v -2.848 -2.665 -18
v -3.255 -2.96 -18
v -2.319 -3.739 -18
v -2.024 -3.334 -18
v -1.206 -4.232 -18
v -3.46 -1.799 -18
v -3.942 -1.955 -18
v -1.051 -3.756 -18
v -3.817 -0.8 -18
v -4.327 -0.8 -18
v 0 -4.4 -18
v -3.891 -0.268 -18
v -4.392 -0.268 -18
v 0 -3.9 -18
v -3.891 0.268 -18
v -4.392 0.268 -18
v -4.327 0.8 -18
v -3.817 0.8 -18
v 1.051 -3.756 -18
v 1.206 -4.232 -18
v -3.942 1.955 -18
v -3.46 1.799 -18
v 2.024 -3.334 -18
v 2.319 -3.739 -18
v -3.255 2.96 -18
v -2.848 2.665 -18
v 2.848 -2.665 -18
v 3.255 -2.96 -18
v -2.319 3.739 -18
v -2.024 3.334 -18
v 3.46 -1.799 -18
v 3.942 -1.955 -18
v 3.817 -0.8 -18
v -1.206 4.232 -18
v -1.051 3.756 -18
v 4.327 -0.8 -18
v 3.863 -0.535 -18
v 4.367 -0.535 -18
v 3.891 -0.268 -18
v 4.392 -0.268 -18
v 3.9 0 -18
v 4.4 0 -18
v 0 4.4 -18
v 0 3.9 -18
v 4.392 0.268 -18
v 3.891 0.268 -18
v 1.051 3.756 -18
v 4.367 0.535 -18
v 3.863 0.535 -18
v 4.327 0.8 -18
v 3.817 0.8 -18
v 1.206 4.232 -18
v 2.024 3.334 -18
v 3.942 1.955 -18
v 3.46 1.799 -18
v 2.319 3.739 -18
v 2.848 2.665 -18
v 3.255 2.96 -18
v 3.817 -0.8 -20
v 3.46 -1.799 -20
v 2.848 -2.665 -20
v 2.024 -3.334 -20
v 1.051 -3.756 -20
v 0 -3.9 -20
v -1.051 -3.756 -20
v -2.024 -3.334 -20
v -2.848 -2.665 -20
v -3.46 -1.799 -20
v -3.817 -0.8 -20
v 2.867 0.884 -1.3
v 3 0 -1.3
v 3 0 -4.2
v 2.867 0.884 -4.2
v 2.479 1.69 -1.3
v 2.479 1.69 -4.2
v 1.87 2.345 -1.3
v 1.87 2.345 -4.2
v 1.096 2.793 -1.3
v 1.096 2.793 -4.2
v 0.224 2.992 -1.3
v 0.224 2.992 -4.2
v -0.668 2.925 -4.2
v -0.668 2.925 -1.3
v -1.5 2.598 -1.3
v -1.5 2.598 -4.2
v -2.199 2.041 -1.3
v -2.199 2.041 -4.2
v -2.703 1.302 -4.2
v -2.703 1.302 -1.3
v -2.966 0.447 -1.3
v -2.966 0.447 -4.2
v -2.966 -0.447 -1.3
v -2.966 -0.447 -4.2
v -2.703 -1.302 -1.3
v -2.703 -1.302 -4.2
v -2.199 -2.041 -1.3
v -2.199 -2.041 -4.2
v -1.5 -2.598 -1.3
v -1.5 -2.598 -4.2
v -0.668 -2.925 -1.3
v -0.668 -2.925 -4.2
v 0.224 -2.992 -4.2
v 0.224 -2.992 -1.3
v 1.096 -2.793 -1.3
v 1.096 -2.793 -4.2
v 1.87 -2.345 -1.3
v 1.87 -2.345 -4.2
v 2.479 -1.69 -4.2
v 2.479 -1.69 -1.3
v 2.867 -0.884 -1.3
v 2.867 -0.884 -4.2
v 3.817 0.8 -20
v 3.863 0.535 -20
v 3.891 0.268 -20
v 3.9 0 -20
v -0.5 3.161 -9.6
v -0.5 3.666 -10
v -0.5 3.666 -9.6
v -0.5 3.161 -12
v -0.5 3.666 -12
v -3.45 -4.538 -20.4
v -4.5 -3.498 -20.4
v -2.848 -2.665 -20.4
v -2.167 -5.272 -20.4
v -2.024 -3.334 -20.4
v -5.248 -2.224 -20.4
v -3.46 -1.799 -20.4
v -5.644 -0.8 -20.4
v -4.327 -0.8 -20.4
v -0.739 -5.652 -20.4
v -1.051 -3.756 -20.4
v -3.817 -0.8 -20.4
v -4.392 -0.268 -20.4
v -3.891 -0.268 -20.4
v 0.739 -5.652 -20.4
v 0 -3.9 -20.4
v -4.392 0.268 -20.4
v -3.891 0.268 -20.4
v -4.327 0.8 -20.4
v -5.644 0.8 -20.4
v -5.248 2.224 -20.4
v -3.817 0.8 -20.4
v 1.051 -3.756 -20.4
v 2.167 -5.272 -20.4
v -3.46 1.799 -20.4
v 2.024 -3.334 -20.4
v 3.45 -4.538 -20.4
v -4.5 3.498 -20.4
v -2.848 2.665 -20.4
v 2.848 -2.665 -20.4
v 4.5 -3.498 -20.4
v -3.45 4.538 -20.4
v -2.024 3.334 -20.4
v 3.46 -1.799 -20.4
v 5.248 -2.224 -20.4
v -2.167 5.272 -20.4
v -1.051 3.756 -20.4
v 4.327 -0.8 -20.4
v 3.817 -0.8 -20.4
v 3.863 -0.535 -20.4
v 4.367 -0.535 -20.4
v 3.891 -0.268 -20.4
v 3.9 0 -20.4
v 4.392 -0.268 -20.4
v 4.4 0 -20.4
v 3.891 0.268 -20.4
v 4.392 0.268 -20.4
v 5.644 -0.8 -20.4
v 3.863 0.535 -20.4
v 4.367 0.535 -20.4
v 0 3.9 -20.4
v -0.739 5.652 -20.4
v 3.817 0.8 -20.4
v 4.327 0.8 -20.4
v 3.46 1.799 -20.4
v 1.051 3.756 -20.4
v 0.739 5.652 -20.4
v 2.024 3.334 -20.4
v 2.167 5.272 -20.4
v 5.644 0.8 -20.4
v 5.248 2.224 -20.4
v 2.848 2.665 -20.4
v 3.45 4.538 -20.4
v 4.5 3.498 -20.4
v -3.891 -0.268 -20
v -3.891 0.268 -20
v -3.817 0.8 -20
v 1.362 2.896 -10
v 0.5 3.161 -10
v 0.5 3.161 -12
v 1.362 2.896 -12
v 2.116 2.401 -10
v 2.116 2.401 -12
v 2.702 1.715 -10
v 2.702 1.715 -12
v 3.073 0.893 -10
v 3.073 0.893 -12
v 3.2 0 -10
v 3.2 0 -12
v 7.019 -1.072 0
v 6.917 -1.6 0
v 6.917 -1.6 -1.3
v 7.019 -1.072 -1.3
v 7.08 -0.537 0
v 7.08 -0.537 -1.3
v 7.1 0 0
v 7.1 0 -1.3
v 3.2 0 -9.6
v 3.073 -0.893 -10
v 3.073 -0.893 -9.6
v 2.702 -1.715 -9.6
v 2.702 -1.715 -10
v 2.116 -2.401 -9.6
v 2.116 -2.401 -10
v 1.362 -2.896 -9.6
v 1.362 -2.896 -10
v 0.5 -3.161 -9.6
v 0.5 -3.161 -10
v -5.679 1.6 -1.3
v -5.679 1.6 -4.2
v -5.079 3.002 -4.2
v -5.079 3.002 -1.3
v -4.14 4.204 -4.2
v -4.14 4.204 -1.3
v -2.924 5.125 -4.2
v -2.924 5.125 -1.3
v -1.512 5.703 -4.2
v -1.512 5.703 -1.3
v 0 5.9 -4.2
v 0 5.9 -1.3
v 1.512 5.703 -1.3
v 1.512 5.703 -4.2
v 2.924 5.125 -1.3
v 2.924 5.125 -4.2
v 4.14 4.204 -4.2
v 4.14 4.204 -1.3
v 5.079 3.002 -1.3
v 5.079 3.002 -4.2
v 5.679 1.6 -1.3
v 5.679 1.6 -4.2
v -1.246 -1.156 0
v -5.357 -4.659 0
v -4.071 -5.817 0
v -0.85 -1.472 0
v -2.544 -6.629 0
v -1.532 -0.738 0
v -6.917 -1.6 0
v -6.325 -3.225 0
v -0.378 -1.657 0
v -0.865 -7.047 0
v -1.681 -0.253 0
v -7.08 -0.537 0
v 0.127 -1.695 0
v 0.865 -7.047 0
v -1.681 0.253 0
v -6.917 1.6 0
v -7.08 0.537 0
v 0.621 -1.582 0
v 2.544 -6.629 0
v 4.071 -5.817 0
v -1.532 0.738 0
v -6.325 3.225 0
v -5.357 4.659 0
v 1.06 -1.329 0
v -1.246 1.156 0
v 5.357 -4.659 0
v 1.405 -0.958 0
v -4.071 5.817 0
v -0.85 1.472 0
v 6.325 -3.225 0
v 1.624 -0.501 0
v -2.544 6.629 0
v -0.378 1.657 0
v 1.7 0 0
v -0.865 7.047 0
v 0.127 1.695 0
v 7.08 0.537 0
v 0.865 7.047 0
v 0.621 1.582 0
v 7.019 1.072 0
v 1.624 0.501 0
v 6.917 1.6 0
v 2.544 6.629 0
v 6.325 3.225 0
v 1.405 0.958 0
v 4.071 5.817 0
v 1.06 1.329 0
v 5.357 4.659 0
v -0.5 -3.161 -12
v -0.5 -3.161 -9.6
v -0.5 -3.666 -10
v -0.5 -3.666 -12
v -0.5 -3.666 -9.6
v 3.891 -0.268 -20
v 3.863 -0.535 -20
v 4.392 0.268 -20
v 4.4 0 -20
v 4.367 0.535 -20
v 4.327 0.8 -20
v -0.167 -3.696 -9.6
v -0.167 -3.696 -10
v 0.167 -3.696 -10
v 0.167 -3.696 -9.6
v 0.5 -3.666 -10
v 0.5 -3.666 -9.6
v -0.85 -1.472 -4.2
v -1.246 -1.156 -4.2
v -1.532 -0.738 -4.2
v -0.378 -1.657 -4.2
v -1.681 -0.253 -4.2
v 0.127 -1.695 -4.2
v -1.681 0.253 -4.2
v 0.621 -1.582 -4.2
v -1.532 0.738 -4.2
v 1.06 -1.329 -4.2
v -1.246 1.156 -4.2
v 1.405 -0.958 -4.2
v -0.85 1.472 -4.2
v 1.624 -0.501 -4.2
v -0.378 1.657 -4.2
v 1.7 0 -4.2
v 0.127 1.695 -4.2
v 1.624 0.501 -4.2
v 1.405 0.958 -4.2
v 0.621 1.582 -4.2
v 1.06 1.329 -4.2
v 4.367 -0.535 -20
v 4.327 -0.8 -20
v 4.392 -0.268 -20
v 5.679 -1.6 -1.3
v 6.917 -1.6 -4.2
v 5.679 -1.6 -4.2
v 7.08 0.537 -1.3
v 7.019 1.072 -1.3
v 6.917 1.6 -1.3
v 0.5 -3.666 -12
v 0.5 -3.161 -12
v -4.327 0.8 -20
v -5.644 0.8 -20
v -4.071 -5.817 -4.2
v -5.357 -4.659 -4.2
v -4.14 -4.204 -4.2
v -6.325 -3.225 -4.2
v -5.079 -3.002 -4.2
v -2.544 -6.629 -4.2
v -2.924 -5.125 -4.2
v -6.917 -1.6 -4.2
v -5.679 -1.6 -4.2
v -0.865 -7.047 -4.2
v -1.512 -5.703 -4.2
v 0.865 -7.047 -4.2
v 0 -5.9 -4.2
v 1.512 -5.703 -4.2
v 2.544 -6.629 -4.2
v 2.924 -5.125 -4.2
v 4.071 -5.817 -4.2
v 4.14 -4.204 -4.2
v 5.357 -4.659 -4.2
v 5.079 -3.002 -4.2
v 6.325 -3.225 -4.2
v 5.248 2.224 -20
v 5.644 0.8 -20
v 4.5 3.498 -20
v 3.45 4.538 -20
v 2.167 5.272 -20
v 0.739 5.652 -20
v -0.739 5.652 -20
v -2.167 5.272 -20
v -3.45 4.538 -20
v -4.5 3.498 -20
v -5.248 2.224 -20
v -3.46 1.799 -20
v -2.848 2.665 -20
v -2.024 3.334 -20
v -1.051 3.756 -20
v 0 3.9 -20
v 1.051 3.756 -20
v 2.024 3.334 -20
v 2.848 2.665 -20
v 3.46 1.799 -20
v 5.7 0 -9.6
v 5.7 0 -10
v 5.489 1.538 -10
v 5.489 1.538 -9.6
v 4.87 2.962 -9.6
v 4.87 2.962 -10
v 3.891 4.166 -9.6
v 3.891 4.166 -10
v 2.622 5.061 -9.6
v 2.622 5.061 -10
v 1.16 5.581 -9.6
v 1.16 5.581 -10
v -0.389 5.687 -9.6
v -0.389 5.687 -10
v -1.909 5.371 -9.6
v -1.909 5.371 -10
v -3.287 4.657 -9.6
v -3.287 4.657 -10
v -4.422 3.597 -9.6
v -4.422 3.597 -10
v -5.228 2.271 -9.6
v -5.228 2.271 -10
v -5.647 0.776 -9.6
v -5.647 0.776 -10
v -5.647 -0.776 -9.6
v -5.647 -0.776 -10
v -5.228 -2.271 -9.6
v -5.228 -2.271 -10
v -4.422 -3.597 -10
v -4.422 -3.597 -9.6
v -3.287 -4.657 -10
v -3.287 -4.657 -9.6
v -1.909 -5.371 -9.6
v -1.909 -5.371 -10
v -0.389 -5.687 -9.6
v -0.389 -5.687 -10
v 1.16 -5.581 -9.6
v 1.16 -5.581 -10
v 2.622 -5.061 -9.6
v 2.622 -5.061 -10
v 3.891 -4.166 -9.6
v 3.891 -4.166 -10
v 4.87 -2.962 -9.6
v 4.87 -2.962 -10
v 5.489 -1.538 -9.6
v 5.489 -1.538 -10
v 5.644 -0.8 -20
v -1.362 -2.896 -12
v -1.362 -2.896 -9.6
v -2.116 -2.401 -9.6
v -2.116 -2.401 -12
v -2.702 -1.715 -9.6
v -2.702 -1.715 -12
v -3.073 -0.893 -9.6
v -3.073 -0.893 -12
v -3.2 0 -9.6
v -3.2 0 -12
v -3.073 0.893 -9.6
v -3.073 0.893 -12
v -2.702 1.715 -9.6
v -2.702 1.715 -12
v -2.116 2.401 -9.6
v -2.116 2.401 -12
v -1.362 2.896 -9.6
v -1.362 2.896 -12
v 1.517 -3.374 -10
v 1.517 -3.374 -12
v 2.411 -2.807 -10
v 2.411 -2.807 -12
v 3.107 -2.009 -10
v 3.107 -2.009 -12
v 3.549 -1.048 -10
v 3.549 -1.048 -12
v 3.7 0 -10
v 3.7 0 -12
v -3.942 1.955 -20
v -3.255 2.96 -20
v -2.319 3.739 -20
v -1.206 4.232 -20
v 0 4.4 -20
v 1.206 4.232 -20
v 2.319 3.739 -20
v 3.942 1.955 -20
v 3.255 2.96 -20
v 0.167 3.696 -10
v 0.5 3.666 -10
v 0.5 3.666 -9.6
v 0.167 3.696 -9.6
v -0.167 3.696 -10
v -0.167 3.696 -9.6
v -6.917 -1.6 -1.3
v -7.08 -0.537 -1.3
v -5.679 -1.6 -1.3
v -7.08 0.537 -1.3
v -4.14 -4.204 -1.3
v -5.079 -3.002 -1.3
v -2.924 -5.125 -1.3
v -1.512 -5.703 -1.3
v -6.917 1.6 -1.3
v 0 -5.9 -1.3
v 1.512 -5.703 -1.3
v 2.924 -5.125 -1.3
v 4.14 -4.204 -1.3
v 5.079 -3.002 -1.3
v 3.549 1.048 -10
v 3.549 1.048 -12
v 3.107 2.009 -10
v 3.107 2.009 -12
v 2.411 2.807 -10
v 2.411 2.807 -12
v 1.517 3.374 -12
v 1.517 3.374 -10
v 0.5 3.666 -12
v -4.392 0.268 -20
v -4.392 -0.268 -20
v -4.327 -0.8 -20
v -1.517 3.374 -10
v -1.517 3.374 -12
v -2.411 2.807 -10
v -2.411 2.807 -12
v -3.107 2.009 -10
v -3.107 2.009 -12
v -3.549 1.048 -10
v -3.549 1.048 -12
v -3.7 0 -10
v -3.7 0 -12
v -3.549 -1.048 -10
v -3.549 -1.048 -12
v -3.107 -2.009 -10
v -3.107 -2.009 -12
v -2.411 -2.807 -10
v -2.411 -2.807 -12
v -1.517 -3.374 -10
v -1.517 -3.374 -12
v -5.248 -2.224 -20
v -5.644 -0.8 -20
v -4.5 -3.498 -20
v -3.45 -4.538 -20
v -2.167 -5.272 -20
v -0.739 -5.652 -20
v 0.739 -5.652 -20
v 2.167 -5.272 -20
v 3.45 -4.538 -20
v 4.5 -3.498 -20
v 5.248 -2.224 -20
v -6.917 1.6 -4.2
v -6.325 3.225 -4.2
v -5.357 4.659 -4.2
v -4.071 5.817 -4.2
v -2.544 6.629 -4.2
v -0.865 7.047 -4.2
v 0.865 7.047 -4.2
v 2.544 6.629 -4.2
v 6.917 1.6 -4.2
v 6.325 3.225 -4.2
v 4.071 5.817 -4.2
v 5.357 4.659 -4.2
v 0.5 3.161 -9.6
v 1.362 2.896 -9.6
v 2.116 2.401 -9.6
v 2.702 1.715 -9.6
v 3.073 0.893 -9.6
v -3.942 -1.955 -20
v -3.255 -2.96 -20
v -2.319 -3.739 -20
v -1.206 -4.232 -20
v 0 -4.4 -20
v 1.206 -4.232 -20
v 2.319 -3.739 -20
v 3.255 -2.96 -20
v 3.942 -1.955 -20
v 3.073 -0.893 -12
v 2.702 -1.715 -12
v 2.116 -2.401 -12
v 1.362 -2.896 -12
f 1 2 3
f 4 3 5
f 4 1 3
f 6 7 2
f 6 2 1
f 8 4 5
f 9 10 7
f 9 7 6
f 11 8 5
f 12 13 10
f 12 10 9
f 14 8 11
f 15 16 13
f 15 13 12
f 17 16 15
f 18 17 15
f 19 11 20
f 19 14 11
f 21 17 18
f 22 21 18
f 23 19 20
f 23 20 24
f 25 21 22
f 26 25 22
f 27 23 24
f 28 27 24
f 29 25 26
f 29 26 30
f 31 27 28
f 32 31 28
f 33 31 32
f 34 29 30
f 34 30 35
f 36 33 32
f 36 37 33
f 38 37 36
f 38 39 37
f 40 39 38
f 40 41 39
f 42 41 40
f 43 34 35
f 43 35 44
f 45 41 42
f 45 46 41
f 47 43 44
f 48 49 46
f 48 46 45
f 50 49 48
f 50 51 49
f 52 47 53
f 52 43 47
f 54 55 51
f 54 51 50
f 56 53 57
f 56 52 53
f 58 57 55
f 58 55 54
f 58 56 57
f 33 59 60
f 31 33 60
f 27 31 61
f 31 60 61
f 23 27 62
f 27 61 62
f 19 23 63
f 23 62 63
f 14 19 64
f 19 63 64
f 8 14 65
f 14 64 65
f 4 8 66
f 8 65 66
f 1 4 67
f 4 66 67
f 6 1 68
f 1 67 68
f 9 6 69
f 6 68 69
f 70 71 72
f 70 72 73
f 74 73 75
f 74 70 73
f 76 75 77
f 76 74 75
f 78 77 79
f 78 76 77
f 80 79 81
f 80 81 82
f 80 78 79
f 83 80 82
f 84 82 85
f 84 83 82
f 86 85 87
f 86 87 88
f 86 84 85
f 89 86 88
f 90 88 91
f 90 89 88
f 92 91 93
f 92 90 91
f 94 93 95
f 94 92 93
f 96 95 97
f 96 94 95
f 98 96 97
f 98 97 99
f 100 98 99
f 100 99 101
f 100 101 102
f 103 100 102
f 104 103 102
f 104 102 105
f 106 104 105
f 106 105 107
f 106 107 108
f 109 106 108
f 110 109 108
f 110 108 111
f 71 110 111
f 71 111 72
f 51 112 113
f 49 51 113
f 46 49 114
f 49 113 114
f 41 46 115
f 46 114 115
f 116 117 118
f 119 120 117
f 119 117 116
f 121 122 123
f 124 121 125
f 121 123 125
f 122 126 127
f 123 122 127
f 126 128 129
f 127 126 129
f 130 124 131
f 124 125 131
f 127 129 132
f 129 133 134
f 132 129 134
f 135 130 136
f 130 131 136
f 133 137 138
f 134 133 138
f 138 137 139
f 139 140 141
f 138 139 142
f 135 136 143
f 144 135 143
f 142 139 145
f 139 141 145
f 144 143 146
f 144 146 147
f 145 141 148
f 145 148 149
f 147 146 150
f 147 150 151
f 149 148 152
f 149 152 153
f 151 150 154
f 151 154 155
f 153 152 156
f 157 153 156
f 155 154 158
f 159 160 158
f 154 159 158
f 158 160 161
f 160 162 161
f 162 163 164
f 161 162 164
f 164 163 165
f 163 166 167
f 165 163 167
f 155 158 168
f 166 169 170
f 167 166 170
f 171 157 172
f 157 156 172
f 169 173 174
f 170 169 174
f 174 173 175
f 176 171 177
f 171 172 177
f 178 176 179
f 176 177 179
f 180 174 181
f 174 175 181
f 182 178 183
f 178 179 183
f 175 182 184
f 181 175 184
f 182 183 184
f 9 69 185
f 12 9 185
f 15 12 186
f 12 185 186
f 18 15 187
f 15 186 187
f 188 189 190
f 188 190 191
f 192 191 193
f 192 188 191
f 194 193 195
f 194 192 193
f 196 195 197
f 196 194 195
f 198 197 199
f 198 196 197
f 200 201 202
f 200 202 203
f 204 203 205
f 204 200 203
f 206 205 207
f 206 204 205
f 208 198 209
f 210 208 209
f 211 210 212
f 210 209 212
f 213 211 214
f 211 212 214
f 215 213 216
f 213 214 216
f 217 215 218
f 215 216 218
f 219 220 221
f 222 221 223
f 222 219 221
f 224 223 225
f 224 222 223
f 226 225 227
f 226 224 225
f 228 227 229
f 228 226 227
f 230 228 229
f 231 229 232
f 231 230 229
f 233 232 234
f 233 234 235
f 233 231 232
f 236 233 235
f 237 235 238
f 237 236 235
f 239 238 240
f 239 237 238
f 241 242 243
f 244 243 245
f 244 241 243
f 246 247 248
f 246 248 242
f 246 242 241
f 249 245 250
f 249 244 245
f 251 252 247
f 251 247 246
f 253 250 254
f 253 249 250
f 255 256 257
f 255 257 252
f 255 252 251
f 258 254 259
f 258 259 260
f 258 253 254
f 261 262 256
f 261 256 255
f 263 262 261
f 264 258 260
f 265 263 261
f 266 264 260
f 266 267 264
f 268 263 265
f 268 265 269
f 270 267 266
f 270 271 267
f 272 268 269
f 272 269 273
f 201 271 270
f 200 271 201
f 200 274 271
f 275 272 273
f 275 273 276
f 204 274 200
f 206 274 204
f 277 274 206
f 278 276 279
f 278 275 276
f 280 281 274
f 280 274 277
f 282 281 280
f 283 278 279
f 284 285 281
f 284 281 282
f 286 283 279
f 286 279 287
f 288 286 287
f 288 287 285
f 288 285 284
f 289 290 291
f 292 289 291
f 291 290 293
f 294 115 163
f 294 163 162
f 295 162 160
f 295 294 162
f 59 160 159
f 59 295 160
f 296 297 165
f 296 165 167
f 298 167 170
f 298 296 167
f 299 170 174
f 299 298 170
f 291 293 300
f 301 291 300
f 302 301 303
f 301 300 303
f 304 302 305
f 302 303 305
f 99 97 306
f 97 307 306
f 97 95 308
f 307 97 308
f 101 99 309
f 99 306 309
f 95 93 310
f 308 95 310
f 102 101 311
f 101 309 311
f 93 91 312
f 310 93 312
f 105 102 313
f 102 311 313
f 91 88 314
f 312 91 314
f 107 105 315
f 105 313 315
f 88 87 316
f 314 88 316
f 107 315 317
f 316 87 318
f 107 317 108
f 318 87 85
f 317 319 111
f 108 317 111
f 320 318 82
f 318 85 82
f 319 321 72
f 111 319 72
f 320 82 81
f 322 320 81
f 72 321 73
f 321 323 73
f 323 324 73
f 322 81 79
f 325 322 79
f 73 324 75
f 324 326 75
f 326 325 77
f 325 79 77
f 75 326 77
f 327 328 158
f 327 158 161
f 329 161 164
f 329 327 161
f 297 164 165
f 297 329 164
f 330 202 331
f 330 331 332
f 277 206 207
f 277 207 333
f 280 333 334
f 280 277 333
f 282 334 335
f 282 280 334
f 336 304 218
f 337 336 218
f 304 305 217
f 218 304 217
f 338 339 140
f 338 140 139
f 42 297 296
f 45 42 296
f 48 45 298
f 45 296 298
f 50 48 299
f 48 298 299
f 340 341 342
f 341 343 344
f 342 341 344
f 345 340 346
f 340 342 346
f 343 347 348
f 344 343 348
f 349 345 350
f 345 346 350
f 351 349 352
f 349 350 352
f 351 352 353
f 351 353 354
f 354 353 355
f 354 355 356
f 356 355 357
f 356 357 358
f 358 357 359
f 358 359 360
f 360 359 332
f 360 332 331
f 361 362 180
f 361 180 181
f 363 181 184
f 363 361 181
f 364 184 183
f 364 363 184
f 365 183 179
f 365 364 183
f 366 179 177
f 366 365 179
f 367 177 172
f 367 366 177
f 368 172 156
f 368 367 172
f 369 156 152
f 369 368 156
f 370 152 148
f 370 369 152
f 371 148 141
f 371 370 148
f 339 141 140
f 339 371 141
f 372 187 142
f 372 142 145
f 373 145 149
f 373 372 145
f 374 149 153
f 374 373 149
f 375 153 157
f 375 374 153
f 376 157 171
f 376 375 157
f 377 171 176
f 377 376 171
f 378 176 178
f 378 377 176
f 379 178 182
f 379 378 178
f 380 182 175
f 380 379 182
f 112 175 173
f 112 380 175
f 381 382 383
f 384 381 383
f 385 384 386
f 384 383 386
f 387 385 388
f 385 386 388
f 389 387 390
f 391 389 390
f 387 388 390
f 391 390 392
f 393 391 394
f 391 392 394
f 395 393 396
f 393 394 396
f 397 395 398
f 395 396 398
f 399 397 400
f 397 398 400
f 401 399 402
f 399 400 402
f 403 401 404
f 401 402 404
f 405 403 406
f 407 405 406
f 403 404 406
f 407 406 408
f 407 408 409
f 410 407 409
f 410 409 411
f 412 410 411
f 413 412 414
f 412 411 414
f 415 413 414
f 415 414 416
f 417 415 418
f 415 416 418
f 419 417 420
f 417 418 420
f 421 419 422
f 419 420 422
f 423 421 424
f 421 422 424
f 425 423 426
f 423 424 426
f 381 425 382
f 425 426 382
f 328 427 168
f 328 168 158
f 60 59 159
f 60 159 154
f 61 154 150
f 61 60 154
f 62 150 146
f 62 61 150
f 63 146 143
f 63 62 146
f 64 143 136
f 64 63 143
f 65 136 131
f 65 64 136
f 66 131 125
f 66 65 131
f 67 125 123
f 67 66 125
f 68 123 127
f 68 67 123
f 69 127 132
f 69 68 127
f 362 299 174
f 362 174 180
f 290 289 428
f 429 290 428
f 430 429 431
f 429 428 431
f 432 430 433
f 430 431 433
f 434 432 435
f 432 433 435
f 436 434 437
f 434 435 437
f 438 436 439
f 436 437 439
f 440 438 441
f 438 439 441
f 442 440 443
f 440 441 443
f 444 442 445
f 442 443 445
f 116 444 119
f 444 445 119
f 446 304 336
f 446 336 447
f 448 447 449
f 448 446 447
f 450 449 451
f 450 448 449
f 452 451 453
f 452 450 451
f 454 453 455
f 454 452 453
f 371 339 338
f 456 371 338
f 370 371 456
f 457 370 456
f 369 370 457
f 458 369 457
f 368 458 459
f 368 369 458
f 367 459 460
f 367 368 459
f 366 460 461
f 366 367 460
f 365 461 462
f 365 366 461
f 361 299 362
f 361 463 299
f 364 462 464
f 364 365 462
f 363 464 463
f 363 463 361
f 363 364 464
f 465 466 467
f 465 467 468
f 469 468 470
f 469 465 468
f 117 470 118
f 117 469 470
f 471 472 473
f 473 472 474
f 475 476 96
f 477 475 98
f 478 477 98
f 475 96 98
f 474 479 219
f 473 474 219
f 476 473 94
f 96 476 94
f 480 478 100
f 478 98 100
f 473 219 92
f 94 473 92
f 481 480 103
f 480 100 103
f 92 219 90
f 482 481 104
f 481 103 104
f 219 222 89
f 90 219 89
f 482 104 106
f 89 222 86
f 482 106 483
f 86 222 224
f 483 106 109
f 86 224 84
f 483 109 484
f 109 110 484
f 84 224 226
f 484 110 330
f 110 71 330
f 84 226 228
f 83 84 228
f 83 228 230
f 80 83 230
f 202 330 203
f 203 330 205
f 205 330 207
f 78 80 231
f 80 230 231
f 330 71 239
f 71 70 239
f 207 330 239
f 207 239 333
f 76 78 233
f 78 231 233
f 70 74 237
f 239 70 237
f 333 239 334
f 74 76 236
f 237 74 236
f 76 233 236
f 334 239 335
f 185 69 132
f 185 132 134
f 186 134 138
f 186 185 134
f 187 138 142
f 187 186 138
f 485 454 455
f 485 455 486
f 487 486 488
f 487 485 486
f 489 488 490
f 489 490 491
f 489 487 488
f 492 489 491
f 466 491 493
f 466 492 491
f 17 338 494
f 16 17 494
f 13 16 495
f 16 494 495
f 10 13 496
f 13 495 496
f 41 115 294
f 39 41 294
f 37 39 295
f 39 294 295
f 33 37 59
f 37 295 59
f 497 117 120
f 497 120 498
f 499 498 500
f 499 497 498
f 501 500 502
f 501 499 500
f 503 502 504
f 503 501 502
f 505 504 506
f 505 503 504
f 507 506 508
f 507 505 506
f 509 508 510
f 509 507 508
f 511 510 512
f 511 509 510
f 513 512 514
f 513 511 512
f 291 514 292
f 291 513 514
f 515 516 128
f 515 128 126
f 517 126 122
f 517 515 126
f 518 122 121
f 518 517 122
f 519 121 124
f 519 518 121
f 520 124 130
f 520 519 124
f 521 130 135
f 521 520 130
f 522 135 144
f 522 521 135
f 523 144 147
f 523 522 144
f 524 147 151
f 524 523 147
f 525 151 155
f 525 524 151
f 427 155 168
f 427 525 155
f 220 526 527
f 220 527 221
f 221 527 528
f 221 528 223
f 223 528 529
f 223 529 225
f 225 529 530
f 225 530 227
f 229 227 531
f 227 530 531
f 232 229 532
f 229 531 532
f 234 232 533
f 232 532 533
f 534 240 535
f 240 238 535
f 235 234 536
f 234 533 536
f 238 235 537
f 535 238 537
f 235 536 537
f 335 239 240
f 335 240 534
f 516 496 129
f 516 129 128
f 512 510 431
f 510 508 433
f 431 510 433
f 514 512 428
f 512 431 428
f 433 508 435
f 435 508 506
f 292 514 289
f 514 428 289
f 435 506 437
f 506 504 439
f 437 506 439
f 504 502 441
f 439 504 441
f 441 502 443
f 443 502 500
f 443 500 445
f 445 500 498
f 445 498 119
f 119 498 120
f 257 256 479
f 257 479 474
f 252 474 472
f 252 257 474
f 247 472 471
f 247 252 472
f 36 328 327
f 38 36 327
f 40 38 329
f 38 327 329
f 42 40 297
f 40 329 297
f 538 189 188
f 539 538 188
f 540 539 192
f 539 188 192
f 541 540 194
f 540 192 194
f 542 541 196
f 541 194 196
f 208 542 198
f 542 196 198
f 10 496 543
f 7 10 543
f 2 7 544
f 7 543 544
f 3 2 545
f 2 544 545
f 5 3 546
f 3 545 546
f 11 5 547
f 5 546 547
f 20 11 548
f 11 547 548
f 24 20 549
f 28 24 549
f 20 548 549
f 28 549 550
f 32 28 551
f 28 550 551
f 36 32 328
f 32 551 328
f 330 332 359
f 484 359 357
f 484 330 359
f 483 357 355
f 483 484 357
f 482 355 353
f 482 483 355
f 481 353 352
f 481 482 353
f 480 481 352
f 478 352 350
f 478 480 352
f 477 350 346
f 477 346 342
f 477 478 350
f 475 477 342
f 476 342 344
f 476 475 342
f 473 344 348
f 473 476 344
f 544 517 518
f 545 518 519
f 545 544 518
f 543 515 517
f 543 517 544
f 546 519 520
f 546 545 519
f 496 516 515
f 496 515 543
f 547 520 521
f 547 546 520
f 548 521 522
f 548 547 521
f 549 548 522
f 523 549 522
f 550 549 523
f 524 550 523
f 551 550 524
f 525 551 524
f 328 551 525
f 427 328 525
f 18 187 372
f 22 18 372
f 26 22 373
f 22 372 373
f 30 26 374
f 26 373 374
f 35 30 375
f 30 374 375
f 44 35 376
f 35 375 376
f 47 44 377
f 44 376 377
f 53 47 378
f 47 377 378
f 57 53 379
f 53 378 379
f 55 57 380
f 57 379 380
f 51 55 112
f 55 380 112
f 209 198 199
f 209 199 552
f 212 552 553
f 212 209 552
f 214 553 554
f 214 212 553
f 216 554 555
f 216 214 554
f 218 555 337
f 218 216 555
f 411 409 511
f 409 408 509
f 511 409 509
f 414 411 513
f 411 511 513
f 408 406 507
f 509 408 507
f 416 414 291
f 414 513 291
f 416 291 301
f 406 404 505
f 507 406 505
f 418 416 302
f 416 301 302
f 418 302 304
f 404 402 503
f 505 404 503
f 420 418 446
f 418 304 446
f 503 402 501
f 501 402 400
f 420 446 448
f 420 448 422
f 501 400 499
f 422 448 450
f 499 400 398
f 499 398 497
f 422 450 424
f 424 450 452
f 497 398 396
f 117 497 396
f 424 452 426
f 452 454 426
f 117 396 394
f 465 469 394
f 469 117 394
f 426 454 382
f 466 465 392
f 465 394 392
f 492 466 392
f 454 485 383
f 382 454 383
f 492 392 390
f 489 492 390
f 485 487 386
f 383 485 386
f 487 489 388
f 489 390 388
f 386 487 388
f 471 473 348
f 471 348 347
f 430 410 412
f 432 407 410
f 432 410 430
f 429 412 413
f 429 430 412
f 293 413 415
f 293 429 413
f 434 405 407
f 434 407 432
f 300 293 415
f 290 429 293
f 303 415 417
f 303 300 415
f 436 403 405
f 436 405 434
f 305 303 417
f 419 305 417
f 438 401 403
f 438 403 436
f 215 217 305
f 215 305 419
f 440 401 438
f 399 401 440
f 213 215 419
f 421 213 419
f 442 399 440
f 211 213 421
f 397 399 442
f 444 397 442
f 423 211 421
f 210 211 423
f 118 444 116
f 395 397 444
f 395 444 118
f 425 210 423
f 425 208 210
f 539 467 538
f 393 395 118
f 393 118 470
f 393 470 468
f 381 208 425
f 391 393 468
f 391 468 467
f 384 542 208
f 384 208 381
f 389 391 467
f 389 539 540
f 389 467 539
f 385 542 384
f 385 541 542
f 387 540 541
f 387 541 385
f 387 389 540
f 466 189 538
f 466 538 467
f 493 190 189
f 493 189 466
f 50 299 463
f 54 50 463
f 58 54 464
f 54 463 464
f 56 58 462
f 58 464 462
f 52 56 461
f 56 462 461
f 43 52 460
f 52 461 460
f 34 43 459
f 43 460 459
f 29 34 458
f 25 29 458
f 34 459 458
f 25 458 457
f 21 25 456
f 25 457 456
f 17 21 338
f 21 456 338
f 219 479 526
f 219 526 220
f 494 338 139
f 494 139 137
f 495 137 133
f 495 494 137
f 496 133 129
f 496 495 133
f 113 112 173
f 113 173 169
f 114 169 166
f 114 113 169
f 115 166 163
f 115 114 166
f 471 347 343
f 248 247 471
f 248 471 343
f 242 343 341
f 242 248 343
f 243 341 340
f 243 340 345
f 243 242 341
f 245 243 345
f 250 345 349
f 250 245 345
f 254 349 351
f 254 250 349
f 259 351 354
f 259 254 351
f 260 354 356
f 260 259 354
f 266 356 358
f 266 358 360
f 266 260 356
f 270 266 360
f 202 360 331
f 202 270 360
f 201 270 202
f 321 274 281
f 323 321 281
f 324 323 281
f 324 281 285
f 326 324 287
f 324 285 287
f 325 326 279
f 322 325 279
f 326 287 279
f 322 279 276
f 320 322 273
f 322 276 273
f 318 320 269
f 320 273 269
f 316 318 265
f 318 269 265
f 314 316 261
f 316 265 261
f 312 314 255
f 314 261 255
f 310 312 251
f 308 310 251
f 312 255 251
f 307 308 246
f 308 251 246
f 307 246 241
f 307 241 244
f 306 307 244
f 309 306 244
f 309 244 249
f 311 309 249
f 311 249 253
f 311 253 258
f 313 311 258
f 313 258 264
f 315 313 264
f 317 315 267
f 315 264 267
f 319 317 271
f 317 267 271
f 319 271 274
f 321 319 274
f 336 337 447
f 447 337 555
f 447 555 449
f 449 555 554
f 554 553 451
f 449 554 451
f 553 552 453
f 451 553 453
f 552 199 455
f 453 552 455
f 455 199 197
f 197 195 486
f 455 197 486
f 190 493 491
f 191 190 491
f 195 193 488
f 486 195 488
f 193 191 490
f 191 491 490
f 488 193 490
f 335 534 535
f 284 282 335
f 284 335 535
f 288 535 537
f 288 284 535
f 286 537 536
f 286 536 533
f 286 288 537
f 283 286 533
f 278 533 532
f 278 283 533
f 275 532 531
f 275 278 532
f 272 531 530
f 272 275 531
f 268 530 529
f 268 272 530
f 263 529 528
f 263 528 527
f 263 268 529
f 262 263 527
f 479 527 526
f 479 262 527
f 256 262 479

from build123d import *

# Parameters (mm, degrees)
F1_DEPTH  = 4.2
F0_R      = 3
F0_R_2    = 1.7
F2_DEPTH  = 1.3
F5_DEPTH  = 2
F4_R      = 5.7
F6_DEPTH  = 0.4
F7_DEPTH  = 2
F10_DEPTH = 2
F11_DEPTH = 0.4


with BuildPart() as f1:
    # F0 (on Top) → F1 (new body)
    with BuildSketch(Plane.XY):
        with BuildLine():
            Line((5.6789083458, 1.6), (6.9173694422, 1.6))
            ThreePointArc((6.9173694422, 1.6), (0, 7.1), (-6.9173694422, 1.6))
            Line((-6.9173694422, 1.6), (-5.6789083458, 1.6))
            ThreePointArc((-5.6789083458, 1.6), (0, 5.9), (5.6789083458, 1.6))
        make_face()
    extrude(amount=-F1_DEPTH)



with BuildPart() as f1b:
    # F0 (on Top) → F1, piece 2 (new body)
    with BuildSketch(Plane.XY):
        with BuildLine():
            ThreePointArc((-6.9173694422, -1.6), (0, -7.1), (6.9173694422, -1.6))
            Line((6.9173694422, -1.6), (5.6789083458, -1.6))
            ThreePointArc((5.6789083458, -1.6), (0, -5.9), (-5.6789083458, -1.6))
            Line((-5.6789083458, -1.6), (-6.9173694422, -1.6))
        make_face()
    extrude(amount=-F1_DEPTH)


with BuildPart() as f1c:
    # F0 (on Top) → F1, piece 3 (new body)
    with BuildSketch(Plane.XY):
        Circle(F0_R)
        Circle(F0_R_2, mode=Mode.SUBTRACT)
    extrude(amount=-F1_DEPTH)


with BuildPart() as f1_1:
    add(f1.part)

    add(f1b.part)  # F2 merges F1b

    add(f1c.part)  # F2 merges F1c
    # F0 (on Top) → F2 (join)
    with BuildSketch(Plane.XY):
        with BuildLine():
            Line((5.6789083458, 1.6), (6.9173694422, 1.6))
            ThreePointArc((6.9173694422, 1.6), (0, 7.1), (-6.9173694422, 1.6))
            Line((-6.9173694422, 1.6), (-5.6789083458, 1.6))
            ThreePointArc((-5.6789083458, 1.6), (0, 5.9), (5.6789083458, 1.6))
        make_face()
        with BuildLine():
            Line((-5.6789083458, 1.6), (-6.9173694422, 1.6))
            ThreePointArc((-6.9173694422, 1.6), (-7.1, 0), (-6.9173694422, -1.6))
            Line((-6.9173694422, -1.6), (-5.6789083458, -1.6))
            ThreePointArc((-5.6789083458, -1.6), (-5.9, 0), (-5.6789083458, 1.6))
        make_face()
        with BuildLine():
            ThreePointArc((-6.9173694422, -1.6), (0, -7.1), (6.9173694422, -1.6))
            Line((6.9173694422, -1.6), (5.6789083458, -1.6))
            ThreePointArc((5.6789083458, -1.6), (0, -5.9), (-5.6789083458, -1.6))
            Line((-5.6789083458, -1.6), (-6.9173694422, -1.6))
        make_face()
        with BuildLine():
            ThreePointArc((6.9173694422, -1.6), (7.0541946046, -0.8051946846), (7.1, 0))
            ThreePointArc((7.1, 0), (7.0541946046, 0.8051946846), (6.9173694422, 1.6))
            Line((6.9173694422, 1.6), (5.6789083458, 1.6))
            ThreePointArc((5.6789083458, 1.6), (5.8444657258, 0.807601622), (5.9, 0))
            ThreePointArc((5.9, 0), (5.8444657258, -0.807601622), (5.6789083458, -1.6))
            Line((5.6789083458, -1.6), (6.9173694422, -1.6))
        make_face()
        with BuildLine():
            Line((5.6789083458, -1.6), (5.6789083458, 1.6))
            ThreePointArc((5.6789083458, 1.6), (0, 5.9), (-5.6789083458, 1.6))
            Line((-5.6789083458, 1.6), (-5.6789083458, -1.6))
            ThreePointArc((-5.6789083458, -1.6), (0, -5.9), (5.6789083458, -1.6))
        make_face()
        Circle(F0_R, mode=Mode.SUBTRACT)
        with BuildLine():
            Line((-5.6789083458, -1.6), (-5.6789083458, 1.6))
            ThreePointArc((-5.6789083458, 1.6), (-5.9, 0), (-5.6789083458, -1.6))
        make_face()
        with BuildLine():
            ThreePointArc((5.9, 0), (5.8444657258, 0.807601622), (5.6789083458, 1.6))
            Line((5.6789083458, 1.6), (5.6789083458, -1.6))
            ThreePointArc((5.6789083458, -1.6), (5.8444657258, -0.807601622), (5.9, 0))
        make_face()
    extrude(amount=-F2_DEPTH)


with BuildPart() as f5:
    # F4 (on offset) → F5 (new body)
    with BuildSketch(Plane.XY.offset(-10)):
        with BuildLine():
            ThreePointArc((-0.5, 3.1606961259), (0, 3.2), (0.5, 3.1606961259))
            Line((0.5, 3.1606961259), (0.5, 3.666060556))
            ThreePointArc((0.5, 3.666060556), (0, 3.7), (-0.5, 3.666060556))
            Line((-0.5, 3.666060556), (-0.5, 3.1606961259))
        make_face()
        with BuildLine():
            ThreePointArc((-0.5, -3.1606961259), (-3.2, 0), (-0.5, 3.1606961259))
            Line((-0.5, 3.1606961259), (-0.5, 3.666060556))
            ThreePointArc((-0.5, 3.666060556), (-3.7, 0), (-0.5, -3.666060556))
            Line((-0.5, -3.666060556), (-0.5, -3.1606961259))
        make_face()
        with BuildLine():
            Line((0.5, -3.666060556), (0.5, -3.1606961259))
            ThreePointArc((0.5, -3.1606961259), (0, -3.2), (-0.5, -3.1606961259))
            Line((-0.5, -3.1606961259), (-0.5, -3.666060556))
            ThreePointArc((-0.5, -3.666060556), (0, -3.7), (0.5, -3.666060556))
        make_face()
        with BuildLine():
            ThreePointArc((0.5, 3.1606961259), (2.4331050121, 2.0784609691), (3.2, 0))
            ThreePointArc((3.2, 0), (2.4331050121, -2.0784609691), (0.5, -3.1606961259))
            Line((0.5, -3.1606961259), (0.5, -3.666060556))
            ThreePointArc((0.5, -3.666060556), (2.787471973, -2.4331050121), (3.7, 0))
            ThreePointArc((3.7, 0), (2.787471973, 2.4331050121), (0.5, 3.666060556))
            Line((0.5, 3.666060556), (0.5, 3.1606961259))
        make_face()
    extrude(amount=-F5_DEPTH)

    # F4 (on offset) → F6 (join)
    with BuildSketch(Plane.XY.offset(-10)):
        Circle(F4_R)
        with BuildLine():
            Line((0.5, 4.331942182), (0.5, 3.666060556))
            ThreePointArc((0.5, 3.666060556), (2.787471973, 2.4331050121), (3.7, 0))
            ThreePointArc((3.7, 0), (2.787471973, -2.4331050121), (0.5, -3.666060556))
            Line((0.5, -3.666060556), (0.5, -4.331942182))
            Line((0.5, -4.331942182), (-0.5, -4.331942182))
            Line((-0.5, -4.331942182), (-0.5, -3.666060556))
            ThreePointArc((-0.5, -3.666060556), (-3.7, 0), (-0.5, 3.666060556))
            Line((-0.5, 3.666060556), (-0.5, 4.331942182))
            Line((-0.5, 4.331942182), (0.5, 4.331942182))
        make_face(mode=Mode.SUBTRACT)
        with BuildLine():
            ThreePointArc((-0.5, -3.1606961259), (-3.2, 0), (-0.5, 3.1606961259))
            Line((-0.5, 3.1606961259), (-0.5, 3.666060556))
            ThreePointArc((-0.5, 3.666060556), (-3.7, 0), (-0.5, -3.666060556))
            Line((-0.5, -3.666060556), (-0.5, -3.1606961259))
        make_face()
        with BuildLine():
            ThreePointArc((0.5, 3.1606961259), (2.4331050121, 2.0784609691), (3.2, 0))
            ThreePointArc((3.2, 0), (2.4331050121, -2.0784609691), (0.5, -3.1606961259))
            Line((0.5, -3.1606961259), (0.5, -3.666060556))
            ThreePointArc((0.5, -3.666060556), (2.787471973, -2.4331050121), (3.7, 0))
            ThreePointArc((3.7, 0), (2.787471973, 2.4331050121), (0.5, 3.666060556))
            Line((0.5, 3.666060556), (0.5, 3.1606961259))
        make_face()
        with BuildLine():
            ThreePointArc((-0.5, 3.666060556), (0, 3.7), (0.5, 3.666060556))
            Line((0.5, 3.666060556), (0.5, 4.331942182))
            Line((0.5, 4.331942182), (-0.5, 4.331942182))
            Line((-0.5, 4.331942182), (-0.5, 3.666060556))
        make_face()
        with BuildLine():
            Line((0.5, -4.331942182), (0.5, -3.666060556))
            ThreePointArc((0.5, -3.666060556), (0, -3.7), (-0.5, -3.666060556))
            Line((-0.5, -3.666060556), (-0.5, -4.331942182))
            Line((-0.5, -4.331942182), (0.5, -4.331942182))
        make_face()
        with BuildLine():
            ThreePointArc((-0.5, 3.1606961259), (0, 3.2), (0.5, 3.1606961259))
            Line((0.5, 3.1606961259), (0.5, 3.666060556))
            ThreePointArc((0.5, 3.666060556), (0, 3.7), (-0.5, 3.666060556))
            Line((-0.5, 3.666060556), (-0.5, 3.1606961259))
        make_face()
        with BuildLine():
            Line((0.5, -3.666060556), (0.5, -3.1606961259))
            ThreePointArc((0.5, -3.1606961259), (0, -3.2), (-0.5, -3.1606961259))
            Line((-0.5, -3.1606961259), (-0.5, -3.666060556))
            ThreePointArc((-0.5, -3.666060556), (0, -3.7), (0.5, -3.666060556))
        make_face()
    extrude(amount=F6_DEPTH)

    # F4 (on offset) → F7 (cut, symmetric)
    with BuildSketch(Plane.XY.offset(-10)):
        with BuildLine():
            ThreePointArc((-0.5, 3.1606961259), (0, 3.2), (0.5, 3.1606961259))
            Line((0.5, 3.1606961259), (0.5, 3.666060556))
            ThreePointArc((0.5, 3.666060556), (0, 3.7), (-0.5, 3.666060556))
            Line((-0.5, 3.666060556), (-0.5, 3.1606961259))
        make_face()
        with BuildLine():
            Line((0.5, -3.666060556), (0.5, -3.1606961259))
            ThreePointArc((0.5, -3.1606961259), (0, -3.2), (-0.5, -3.1606961259))
            Line((-0.5, -3.1606961259), (-0.5, -3.666060556))
            ThreePointArc((-0.5, -3.666060556), (0, -3.7), (0.5, -3.666060556))
        make_face()
    extrude(amount=F7_DEPTH, both=True, mode=Mode.SUBTRACT)


with BuildPart() as f10:
    # F9 (on offset) → F10 (new body)
    with BuildSketch(Plane.XY.offset(-20)):
        with BuildLine():
            Line((3.8170669368, 0.8), (4.3266615306, 0.8))
            ThreePointArc((4.3266615306, 0.8), (0, 4.4), (-4.3266615306, 0.8))
            Line((-4.3266615306, 0.8), (-3.8170669368, 0.8))
            ThreePointArc((-3.8170669368, 0.8), (0, 3.9), (3.8170669368, 0.8))
        make_face()
        with BuildLine():
            Line((-3.8170669368, 0.8), (-4.3266615306, 0.8))
            ThreePointArc((-4.3266615306, 0.8), (-4.4, 0), (-4.3266615306, -0.8))
            Line((-4.3266615306, -0.8), (-3.8170669368, -0.8))
            ThreePointArc((-3.8170669368, -0.8), (-3.9, 0), (-3.8170669368, 0.8))
        make_face()
        with BuildLine():
            ThreePointArc((-4.3266615306, -0.8), (0, -4.4), (4.3266615306, -0.8))
            Line((4.3266615306, -0.8), (3.8170669368, -0.8))
            ThreePointArc((3.8170669368, -0.8), (0, -3.9), (-3.8170669368, -0.8))
            Line((-3.8170669368, -0.8), (-4.3266615306, -0.8))
        make_face()
        with BuildLine():
            ThreePointArc((4.4, 0), (4.3816270228, 0.4016772744), (4.3266615306, 0.8))
            Line((4.3266615306, 0.8), (3.8170669368, 0.8))
            ThreePointArc((3.8170669368, 0.8), (3.8792113279, 0.4021435978), (3.9, 0))
            ThreePointArc((3.9, 0), (3.8792113279, -0.4021435978), (3.8170669368, -0.8))
            Line((3.8170669368, -0.8), (4.3266615306, -0.8))
            ThreePointArc((4.3266615306, -0.8), (4.3816270228, -0.4016772744), (4.4, 0))
        make_face()
    extrude(amount=F10_DEPTH)

    # F9 (on offset) → F11 (join)
    with BuildSketch(Plane.XY.offset(-20)):
        with BuildLine():
            Line((4.3266615306, 0.8), (5.6435804238, 0.8))
            ThreePointArc((5.6435804238, 0.8), (0, 5.7), (-5.6435804238, 0.8))
            Line((-5.6435804238, 0.8), (-4.3266615306, 0.8))
            ThreePointArc((-4.3266615306, 0.8), (0, 4.4), (4.3266615306, 0.8))
        make_face()
        with BuildLine():
            ThreePointArc((-5.6435804238, -0.8), (0, -5.7), (5.6435804238, -0.8))
            Line((5.6435804238, -0.8), (4.3266615306, -0.8))
            ThreePointArc((4.3266615306, -0.8), (0, -4.4), (-4.3266615306, -0.8))
            Line((-4.3266615306, -0.8), (-5.6435804238, -0.8))
        make_face()
        with BuildLine():
            Line((3.8170669368, 0.8), (4.3266615306, 0.8))
            ThreePointArc((4.3266615306, 0.8), (0, 4.4), (-4.3266615306, 0.8))
            Line((-4.3266615306, 0.8), (-3.8170669368, 0.8))
            ThreePointArc((-3.8170669368, 0.8), (0, 3.9), (3.8170669368, 0.8))
        make_face()
        with BuildLine():
            ThreePointArc((4.4, 0), (4.3816270228, 0.4016772744), (4.3266615306, 0.8))
            Line((4.3266615306, 0.8), (3.8170669368, 0.8))
            ThreePointArc((3.8170669368, 0.8), (3.8792113279, 0.4021435978), (3.9, 0))
            ThreePointArc((3.9, 0), (3.8792113279, -0.4021435978), (3.8170669368, -0.8))
            Line((3.8170669368, -0.8), (4.3266615306, -0.8))
            ThreePointArc((4.3266615306, -0.8), (4.3816270228, -0.4016772744), (4.4, 0))
        make_face()
        with BuildLine():
            ThreePointArc((-4.3266615306, -0.8), (0, -4.4), (4.3266615306, -0.8))
            Line((4.3266615306, -0.8), (3.8170669368, -0.8))
            ThreePointArc((3.8170669368, -0.8), (0, -3.9), (-3.8170669368, -0.8))
            Line((-3.8170669368, -0.8), (-4.3266615306, -0.8))
        make_face()
        with BuildLine():
            Line((-3.8170669368, 0.8), (-4.3266615306, 0.8))
            ThreePointArc((-4.3266615306, 0.8), (-4.4, 0), (-4.3266615306, -0.8))
            Line((-4.3266615306, -0.8), (-3.8170669368, -0.8))
            ThreePointArc((-3.8170669368, -0.8), (-3.9, 0), (-3.8170669368, 0.8))
        make_face()
    extrude(amount=-F11_DEPTH)


solid = Compound([f1_1.part, f5.part, f10.part])
